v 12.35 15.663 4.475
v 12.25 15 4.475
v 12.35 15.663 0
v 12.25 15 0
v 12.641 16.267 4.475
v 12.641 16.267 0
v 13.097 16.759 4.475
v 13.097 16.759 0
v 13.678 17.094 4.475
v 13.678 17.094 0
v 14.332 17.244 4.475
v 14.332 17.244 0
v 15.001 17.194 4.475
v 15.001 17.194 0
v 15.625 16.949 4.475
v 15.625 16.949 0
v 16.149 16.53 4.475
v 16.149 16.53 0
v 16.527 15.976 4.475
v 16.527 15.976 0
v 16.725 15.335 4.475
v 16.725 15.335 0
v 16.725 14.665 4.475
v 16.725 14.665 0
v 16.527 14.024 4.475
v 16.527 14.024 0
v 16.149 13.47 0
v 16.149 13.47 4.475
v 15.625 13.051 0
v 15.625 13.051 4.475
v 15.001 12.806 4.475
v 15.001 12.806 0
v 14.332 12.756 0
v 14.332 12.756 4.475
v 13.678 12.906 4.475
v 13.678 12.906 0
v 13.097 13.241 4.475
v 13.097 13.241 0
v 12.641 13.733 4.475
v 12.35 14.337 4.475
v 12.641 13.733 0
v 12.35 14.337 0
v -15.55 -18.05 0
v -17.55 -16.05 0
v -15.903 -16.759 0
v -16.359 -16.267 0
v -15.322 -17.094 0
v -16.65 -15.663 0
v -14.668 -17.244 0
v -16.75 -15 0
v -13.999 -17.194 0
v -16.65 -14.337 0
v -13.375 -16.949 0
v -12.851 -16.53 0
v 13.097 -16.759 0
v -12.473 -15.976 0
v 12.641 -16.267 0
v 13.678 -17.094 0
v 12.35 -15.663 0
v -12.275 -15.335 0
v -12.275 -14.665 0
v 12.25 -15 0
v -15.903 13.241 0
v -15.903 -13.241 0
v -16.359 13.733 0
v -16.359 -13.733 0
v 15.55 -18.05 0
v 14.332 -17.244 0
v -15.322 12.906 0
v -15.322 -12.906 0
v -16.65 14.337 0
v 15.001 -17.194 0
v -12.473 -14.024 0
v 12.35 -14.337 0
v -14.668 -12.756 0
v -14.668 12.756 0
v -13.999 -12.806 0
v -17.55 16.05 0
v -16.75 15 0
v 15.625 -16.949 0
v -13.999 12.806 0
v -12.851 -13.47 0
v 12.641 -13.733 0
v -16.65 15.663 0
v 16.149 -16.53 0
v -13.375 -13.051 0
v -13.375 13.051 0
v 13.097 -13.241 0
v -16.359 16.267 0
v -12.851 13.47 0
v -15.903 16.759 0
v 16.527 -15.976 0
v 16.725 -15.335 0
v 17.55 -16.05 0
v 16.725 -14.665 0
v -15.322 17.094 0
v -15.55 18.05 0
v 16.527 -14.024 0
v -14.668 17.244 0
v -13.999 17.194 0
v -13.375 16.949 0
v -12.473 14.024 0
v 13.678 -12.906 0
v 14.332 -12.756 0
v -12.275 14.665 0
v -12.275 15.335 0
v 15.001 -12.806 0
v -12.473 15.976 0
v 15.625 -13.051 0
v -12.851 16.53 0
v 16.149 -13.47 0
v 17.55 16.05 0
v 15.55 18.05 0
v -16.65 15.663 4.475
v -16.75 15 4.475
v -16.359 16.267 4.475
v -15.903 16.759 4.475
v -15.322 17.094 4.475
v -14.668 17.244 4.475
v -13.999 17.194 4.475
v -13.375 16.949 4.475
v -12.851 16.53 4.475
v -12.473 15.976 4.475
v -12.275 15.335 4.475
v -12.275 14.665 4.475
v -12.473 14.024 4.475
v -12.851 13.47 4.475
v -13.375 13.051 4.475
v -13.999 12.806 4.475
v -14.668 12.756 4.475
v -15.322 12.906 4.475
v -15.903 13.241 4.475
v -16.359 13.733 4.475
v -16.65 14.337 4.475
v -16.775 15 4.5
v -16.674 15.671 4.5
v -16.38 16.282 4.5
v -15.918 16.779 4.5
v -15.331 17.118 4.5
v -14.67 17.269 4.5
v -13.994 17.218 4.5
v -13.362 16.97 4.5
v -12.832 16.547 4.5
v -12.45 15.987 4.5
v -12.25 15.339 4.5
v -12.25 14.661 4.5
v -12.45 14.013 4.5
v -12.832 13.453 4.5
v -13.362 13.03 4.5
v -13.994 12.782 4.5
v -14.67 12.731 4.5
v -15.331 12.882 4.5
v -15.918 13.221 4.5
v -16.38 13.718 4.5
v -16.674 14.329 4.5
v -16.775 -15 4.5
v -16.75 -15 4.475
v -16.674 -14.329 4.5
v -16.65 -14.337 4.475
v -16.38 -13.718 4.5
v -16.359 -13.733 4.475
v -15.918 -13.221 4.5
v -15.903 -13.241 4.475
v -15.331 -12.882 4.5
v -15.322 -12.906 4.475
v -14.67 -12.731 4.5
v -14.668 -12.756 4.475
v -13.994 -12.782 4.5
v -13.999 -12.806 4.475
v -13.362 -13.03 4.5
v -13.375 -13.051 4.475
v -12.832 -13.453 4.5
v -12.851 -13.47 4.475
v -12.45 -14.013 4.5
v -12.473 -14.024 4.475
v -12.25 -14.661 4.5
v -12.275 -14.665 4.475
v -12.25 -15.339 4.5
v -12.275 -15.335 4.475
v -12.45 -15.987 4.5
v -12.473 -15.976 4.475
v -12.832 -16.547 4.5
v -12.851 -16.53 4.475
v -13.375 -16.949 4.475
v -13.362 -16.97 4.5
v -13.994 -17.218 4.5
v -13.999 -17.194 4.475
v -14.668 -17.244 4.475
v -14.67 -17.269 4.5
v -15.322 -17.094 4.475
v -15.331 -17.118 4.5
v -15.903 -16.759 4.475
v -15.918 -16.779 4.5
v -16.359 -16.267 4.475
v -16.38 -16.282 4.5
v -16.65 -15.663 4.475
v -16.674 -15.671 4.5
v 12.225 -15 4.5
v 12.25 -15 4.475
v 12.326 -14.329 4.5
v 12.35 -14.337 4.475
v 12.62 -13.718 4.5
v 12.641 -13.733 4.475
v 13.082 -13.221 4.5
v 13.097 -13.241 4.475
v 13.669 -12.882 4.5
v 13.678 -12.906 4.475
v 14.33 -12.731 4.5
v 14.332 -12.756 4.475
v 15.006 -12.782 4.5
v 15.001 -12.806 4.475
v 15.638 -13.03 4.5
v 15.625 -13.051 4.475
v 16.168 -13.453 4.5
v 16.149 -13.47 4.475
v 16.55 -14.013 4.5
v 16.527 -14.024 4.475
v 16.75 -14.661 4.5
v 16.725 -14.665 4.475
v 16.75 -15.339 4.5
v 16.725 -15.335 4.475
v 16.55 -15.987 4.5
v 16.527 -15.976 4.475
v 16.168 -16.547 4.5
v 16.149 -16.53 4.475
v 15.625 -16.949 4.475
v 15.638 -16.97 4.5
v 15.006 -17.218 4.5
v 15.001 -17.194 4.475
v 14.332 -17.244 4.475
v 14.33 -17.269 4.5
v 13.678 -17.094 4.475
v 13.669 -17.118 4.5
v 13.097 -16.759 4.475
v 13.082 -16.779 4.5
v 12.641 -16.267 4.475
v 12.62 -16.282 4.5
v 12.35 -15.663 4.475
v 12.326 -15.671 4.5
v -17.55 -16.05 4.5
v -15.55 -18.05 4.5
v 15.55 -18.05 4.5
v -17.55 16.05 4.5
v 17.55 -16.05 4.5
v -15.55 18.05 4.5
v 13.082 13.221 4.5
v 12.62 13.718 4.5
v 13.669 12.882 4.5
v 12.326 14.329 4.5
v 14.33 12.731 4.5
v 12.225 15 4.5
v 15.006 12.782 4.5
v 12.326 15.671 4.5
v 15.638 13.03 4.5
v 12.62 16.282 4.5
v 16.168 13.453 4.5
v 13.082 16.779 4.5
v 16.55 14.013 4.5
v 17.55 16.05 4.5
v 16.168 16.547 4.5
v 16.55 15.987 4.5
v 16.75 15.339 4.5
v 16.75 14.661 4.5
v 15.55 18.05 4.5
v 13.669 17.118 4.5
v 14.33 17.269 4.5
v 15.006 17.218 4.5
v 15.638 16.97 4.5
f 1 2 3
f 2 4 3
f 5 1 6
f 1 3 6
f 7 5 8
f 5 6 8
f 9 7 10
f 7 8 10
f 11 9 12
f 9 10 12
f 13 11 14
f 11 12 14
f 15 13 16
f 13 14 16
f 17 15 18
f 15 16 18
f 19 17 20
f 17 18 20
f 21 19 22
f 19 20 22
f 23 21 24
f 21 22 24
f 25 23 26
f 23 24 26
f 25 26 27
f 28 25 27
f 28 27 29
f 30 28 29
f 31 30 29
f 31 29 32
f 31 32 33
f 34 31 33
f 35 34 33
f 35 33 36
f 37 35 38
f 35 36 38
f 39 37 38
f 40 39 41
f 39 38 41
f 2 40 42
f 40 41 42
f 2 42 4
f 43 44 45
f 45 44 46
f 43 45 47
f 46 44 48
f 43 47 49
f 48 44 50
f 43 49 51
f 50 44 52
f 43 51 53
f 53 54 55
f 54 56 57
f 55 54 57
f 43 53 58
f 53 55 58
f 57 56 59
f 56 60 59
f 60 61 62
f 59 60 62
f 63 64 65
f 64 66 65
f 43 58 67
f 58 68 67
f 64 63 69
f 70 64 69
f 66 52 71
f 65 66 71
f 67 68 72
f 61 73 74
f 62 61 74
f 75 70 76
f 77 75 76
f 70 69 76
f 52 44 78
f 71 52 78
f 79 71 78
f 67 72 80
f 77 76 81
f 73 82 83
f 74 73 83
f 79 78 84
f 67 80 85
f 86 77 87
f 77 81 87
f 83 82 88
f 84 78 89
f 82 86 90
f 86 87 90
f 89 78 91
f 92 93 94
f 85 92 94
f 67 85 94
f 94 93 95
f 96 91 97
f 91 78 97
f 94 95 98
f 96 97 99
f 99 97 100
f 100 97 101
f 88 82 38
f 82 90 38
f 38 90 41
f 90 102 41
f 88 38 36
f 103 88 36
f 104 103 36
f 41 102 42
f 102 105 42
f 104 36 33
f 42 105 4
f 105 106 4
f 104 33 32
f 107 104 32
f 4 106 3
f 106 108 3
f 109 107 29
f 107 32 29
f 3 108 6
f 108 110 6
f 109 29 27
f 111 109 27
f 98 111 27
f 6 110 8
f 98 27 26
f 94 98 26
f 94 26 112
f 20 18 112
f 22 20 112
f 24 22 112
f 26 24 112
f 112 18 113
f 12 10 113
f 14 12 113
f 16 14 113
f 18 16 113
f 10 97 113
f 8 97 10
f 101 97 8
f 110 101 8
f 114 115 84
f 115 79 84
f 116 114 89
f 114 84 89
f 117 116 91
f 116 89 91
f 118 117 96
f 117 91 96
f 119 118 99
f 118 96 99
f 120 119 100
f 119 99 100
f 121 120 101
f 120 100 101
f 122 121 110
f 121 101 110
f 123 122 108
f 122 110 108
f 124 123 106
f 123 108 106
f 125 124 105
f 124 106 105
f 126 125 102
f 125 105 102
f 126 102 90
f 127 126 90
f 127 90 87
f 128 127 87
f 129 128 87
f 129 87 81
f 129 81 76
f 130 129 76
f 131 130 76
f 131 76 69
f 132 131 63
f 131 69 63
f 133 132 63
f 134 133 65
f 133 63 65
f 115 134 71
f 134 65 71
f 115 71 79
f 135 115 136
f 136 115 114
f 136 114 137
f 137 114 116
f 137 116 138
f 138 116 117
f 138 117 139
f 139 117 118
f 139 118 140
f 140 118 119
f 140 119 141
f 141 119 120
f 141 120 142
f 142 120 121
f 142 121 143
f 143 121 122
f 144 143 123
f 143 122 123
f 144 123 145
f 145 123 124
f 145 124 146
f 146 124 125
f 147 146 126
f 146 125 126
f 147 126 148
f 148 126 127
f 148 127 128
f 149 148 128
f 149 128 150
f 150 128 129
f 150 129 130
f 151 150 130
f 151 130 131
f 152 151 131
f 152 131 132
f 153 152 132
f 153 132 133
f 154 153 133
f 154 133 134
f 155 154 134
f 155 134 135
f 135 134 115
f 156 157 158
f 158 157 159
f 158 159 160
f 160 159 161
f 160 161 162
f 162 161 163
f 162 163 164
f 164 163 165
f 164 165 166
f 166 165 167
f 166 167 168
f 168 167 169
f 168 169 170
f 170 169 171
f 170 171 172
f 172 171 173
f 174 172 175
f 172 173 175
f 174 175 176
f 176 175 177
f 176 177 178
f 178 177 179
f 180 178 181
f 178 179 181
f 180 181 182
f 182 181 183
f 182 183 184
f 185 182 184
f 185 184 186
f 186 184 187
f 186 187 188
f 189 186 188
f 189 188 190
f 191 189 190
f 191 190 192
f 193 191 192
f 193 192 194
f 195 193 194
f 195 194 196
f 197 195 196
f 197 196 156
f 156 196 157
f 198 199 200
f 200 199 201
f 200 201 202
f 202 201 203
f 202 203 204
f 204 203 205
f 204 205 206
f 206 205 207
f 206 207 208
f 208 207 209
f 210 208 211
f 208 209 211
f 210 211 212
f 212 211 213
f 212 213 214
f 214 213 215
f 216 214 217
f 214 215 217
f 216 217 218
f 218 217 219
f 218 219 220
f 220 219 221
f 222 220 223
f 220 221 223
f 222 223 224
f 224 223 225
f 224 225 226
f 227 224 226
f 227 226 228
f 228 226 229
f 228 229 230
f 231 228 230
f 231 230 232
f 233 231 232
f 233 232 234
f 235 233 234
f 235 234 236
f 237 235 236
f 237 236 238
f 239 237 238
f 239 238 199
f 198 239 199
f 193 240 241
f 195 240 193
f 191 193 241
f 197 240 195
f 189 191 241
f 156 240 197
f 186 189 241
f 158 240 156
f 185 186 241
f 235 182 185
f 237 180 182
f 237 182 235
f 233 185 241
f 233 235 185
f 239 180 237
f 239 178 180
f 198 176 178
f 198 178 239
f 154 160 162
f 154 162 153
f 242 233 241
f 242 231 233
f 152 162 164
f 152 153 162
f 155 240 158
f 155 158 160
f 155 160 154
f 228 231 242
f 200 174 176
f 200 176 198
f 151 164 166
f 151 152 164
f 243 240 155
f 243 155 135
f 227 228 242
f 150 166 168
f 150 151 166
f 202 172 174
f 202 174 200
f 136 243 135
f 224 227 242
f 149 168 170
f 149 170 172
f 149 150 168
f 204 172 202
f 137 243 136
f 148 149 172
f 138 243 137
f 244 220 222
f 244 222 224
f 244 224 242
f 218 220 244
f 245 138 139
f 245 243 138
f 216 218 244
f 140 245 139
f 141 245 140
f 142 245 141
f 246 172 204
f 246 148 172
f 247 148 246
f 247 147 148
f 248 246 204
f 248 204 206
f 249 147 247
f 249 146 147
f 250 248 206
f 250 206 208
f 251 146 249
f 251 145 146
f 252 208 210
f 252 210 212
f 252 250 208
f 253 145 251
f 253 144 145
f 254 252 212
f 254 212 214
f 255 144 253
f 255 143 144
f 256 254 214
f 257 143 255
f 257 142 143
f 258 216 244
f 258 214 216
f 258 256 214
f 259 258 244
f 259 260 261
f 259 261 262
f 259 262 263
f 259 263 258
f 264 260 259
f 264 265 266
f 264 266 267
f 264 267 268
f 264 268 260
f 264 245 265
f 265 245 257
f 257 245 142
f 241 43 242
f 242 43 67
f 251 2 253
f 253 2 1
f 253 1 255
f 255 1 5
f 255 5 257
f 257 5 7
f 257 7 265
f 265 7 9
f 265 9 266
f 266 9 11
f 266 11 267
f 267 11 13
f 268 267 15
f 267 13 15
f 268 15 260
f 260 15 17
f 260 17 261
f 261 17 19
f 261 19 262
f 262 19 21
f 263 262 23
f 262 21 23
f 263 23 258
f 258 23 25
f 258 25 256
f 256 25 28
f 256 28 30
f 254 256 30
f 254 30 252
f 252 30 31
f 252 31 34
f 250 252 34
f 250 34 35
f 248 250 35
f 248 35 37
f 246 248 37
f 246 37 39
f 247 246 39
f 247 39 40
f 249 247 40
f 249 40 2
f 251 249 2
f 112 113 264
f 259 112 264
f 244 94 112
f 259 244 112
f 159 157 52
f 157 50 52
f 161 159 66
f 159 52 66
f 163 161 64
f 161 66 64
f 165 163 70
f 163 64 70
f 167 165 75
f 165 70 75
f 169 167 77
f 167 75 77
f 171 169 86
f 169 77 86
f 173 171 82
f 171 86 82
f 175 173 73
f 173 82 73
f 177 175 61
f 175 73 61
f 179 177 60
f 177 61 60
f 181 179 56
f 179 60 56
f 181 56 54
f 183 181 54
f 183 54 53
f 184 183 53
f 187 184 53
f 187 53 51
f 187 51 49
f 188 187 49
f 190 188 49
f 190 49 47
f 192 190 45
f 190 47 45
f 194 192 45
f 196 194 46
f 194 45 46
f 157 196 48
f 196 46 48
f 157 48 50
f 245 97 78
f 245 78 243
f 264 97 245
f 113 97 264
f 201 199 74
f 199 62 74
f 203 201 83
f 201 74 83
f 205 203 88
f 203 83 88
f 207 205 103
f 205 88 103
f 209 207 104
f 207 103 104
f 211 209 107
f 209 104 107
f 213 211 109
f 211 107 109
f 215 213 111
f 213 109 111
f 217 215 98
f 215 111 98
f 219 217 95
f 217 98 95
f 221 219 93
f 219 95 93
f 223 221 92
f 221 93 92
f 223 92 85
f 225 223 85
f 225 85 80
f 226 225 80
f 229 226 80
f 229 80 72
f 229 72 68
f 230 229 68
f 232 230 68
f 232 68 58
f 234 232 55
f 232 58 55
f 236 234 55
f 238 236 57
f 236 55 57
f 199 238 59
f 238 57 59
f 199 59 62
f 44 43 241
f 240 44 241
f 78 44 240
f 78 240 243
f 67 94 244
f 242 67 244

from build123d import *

# Parameters (mm, degrees)
SKETCH_1_W                  = 35.1
SKETCH_1_H                  = 36.1
EXTRUDE_1_DEPTH             = 4.5
CHAMFER_1_SIZE              = 2
HOLE_WIZARD_M41_D           = 4.5
HOLE_WIZARD_M41_CSINK_D     = 4.55
HOLE_WIZARD_M41_CSINK_ANGLE = 90


with BuildPart() as part:
    # Эскиз1 → Бобышка-Вытянуть1 (new body)
    with BuildSketch(Plane.XY):
        Rectangle(SKETCH_1_W, SKETCH_1_H)
    extrude(amount=EXTRUDE_1_DEPTH)

    # Фаска1
    chamfer_1_edges = [part.edges().sort_by_distance(p)[0] for p in [
        (17.55, -18.05, 2.25),
        (-17.55, -18.05, 2.25),
        (-17.55, 18.05, 2.25),
        (17.55, 18.05, 2.25),
    ]]
    chamfer(chamfer_1_edges, length=CHAMFER_1_SIZE)

    # Отверстие с зазором M41 (through all)
    with Locations(Plane(origin=(-14.5, 15, 4.5), x_dir=(1, 0, 0), z_dir=(0, 0, 1))):
        with Locations((0, 0), (29, 0), (29, -30), (0, -30)):
            CounterSinkHole(HOLE_WIZARD_M41_D / 2, HOLE_WIZARD_M41_CSINK_D / 2, counter_sink_angle=HOLE_WIZARD_M41_CSINK_ANGLE)


solid = part.part
